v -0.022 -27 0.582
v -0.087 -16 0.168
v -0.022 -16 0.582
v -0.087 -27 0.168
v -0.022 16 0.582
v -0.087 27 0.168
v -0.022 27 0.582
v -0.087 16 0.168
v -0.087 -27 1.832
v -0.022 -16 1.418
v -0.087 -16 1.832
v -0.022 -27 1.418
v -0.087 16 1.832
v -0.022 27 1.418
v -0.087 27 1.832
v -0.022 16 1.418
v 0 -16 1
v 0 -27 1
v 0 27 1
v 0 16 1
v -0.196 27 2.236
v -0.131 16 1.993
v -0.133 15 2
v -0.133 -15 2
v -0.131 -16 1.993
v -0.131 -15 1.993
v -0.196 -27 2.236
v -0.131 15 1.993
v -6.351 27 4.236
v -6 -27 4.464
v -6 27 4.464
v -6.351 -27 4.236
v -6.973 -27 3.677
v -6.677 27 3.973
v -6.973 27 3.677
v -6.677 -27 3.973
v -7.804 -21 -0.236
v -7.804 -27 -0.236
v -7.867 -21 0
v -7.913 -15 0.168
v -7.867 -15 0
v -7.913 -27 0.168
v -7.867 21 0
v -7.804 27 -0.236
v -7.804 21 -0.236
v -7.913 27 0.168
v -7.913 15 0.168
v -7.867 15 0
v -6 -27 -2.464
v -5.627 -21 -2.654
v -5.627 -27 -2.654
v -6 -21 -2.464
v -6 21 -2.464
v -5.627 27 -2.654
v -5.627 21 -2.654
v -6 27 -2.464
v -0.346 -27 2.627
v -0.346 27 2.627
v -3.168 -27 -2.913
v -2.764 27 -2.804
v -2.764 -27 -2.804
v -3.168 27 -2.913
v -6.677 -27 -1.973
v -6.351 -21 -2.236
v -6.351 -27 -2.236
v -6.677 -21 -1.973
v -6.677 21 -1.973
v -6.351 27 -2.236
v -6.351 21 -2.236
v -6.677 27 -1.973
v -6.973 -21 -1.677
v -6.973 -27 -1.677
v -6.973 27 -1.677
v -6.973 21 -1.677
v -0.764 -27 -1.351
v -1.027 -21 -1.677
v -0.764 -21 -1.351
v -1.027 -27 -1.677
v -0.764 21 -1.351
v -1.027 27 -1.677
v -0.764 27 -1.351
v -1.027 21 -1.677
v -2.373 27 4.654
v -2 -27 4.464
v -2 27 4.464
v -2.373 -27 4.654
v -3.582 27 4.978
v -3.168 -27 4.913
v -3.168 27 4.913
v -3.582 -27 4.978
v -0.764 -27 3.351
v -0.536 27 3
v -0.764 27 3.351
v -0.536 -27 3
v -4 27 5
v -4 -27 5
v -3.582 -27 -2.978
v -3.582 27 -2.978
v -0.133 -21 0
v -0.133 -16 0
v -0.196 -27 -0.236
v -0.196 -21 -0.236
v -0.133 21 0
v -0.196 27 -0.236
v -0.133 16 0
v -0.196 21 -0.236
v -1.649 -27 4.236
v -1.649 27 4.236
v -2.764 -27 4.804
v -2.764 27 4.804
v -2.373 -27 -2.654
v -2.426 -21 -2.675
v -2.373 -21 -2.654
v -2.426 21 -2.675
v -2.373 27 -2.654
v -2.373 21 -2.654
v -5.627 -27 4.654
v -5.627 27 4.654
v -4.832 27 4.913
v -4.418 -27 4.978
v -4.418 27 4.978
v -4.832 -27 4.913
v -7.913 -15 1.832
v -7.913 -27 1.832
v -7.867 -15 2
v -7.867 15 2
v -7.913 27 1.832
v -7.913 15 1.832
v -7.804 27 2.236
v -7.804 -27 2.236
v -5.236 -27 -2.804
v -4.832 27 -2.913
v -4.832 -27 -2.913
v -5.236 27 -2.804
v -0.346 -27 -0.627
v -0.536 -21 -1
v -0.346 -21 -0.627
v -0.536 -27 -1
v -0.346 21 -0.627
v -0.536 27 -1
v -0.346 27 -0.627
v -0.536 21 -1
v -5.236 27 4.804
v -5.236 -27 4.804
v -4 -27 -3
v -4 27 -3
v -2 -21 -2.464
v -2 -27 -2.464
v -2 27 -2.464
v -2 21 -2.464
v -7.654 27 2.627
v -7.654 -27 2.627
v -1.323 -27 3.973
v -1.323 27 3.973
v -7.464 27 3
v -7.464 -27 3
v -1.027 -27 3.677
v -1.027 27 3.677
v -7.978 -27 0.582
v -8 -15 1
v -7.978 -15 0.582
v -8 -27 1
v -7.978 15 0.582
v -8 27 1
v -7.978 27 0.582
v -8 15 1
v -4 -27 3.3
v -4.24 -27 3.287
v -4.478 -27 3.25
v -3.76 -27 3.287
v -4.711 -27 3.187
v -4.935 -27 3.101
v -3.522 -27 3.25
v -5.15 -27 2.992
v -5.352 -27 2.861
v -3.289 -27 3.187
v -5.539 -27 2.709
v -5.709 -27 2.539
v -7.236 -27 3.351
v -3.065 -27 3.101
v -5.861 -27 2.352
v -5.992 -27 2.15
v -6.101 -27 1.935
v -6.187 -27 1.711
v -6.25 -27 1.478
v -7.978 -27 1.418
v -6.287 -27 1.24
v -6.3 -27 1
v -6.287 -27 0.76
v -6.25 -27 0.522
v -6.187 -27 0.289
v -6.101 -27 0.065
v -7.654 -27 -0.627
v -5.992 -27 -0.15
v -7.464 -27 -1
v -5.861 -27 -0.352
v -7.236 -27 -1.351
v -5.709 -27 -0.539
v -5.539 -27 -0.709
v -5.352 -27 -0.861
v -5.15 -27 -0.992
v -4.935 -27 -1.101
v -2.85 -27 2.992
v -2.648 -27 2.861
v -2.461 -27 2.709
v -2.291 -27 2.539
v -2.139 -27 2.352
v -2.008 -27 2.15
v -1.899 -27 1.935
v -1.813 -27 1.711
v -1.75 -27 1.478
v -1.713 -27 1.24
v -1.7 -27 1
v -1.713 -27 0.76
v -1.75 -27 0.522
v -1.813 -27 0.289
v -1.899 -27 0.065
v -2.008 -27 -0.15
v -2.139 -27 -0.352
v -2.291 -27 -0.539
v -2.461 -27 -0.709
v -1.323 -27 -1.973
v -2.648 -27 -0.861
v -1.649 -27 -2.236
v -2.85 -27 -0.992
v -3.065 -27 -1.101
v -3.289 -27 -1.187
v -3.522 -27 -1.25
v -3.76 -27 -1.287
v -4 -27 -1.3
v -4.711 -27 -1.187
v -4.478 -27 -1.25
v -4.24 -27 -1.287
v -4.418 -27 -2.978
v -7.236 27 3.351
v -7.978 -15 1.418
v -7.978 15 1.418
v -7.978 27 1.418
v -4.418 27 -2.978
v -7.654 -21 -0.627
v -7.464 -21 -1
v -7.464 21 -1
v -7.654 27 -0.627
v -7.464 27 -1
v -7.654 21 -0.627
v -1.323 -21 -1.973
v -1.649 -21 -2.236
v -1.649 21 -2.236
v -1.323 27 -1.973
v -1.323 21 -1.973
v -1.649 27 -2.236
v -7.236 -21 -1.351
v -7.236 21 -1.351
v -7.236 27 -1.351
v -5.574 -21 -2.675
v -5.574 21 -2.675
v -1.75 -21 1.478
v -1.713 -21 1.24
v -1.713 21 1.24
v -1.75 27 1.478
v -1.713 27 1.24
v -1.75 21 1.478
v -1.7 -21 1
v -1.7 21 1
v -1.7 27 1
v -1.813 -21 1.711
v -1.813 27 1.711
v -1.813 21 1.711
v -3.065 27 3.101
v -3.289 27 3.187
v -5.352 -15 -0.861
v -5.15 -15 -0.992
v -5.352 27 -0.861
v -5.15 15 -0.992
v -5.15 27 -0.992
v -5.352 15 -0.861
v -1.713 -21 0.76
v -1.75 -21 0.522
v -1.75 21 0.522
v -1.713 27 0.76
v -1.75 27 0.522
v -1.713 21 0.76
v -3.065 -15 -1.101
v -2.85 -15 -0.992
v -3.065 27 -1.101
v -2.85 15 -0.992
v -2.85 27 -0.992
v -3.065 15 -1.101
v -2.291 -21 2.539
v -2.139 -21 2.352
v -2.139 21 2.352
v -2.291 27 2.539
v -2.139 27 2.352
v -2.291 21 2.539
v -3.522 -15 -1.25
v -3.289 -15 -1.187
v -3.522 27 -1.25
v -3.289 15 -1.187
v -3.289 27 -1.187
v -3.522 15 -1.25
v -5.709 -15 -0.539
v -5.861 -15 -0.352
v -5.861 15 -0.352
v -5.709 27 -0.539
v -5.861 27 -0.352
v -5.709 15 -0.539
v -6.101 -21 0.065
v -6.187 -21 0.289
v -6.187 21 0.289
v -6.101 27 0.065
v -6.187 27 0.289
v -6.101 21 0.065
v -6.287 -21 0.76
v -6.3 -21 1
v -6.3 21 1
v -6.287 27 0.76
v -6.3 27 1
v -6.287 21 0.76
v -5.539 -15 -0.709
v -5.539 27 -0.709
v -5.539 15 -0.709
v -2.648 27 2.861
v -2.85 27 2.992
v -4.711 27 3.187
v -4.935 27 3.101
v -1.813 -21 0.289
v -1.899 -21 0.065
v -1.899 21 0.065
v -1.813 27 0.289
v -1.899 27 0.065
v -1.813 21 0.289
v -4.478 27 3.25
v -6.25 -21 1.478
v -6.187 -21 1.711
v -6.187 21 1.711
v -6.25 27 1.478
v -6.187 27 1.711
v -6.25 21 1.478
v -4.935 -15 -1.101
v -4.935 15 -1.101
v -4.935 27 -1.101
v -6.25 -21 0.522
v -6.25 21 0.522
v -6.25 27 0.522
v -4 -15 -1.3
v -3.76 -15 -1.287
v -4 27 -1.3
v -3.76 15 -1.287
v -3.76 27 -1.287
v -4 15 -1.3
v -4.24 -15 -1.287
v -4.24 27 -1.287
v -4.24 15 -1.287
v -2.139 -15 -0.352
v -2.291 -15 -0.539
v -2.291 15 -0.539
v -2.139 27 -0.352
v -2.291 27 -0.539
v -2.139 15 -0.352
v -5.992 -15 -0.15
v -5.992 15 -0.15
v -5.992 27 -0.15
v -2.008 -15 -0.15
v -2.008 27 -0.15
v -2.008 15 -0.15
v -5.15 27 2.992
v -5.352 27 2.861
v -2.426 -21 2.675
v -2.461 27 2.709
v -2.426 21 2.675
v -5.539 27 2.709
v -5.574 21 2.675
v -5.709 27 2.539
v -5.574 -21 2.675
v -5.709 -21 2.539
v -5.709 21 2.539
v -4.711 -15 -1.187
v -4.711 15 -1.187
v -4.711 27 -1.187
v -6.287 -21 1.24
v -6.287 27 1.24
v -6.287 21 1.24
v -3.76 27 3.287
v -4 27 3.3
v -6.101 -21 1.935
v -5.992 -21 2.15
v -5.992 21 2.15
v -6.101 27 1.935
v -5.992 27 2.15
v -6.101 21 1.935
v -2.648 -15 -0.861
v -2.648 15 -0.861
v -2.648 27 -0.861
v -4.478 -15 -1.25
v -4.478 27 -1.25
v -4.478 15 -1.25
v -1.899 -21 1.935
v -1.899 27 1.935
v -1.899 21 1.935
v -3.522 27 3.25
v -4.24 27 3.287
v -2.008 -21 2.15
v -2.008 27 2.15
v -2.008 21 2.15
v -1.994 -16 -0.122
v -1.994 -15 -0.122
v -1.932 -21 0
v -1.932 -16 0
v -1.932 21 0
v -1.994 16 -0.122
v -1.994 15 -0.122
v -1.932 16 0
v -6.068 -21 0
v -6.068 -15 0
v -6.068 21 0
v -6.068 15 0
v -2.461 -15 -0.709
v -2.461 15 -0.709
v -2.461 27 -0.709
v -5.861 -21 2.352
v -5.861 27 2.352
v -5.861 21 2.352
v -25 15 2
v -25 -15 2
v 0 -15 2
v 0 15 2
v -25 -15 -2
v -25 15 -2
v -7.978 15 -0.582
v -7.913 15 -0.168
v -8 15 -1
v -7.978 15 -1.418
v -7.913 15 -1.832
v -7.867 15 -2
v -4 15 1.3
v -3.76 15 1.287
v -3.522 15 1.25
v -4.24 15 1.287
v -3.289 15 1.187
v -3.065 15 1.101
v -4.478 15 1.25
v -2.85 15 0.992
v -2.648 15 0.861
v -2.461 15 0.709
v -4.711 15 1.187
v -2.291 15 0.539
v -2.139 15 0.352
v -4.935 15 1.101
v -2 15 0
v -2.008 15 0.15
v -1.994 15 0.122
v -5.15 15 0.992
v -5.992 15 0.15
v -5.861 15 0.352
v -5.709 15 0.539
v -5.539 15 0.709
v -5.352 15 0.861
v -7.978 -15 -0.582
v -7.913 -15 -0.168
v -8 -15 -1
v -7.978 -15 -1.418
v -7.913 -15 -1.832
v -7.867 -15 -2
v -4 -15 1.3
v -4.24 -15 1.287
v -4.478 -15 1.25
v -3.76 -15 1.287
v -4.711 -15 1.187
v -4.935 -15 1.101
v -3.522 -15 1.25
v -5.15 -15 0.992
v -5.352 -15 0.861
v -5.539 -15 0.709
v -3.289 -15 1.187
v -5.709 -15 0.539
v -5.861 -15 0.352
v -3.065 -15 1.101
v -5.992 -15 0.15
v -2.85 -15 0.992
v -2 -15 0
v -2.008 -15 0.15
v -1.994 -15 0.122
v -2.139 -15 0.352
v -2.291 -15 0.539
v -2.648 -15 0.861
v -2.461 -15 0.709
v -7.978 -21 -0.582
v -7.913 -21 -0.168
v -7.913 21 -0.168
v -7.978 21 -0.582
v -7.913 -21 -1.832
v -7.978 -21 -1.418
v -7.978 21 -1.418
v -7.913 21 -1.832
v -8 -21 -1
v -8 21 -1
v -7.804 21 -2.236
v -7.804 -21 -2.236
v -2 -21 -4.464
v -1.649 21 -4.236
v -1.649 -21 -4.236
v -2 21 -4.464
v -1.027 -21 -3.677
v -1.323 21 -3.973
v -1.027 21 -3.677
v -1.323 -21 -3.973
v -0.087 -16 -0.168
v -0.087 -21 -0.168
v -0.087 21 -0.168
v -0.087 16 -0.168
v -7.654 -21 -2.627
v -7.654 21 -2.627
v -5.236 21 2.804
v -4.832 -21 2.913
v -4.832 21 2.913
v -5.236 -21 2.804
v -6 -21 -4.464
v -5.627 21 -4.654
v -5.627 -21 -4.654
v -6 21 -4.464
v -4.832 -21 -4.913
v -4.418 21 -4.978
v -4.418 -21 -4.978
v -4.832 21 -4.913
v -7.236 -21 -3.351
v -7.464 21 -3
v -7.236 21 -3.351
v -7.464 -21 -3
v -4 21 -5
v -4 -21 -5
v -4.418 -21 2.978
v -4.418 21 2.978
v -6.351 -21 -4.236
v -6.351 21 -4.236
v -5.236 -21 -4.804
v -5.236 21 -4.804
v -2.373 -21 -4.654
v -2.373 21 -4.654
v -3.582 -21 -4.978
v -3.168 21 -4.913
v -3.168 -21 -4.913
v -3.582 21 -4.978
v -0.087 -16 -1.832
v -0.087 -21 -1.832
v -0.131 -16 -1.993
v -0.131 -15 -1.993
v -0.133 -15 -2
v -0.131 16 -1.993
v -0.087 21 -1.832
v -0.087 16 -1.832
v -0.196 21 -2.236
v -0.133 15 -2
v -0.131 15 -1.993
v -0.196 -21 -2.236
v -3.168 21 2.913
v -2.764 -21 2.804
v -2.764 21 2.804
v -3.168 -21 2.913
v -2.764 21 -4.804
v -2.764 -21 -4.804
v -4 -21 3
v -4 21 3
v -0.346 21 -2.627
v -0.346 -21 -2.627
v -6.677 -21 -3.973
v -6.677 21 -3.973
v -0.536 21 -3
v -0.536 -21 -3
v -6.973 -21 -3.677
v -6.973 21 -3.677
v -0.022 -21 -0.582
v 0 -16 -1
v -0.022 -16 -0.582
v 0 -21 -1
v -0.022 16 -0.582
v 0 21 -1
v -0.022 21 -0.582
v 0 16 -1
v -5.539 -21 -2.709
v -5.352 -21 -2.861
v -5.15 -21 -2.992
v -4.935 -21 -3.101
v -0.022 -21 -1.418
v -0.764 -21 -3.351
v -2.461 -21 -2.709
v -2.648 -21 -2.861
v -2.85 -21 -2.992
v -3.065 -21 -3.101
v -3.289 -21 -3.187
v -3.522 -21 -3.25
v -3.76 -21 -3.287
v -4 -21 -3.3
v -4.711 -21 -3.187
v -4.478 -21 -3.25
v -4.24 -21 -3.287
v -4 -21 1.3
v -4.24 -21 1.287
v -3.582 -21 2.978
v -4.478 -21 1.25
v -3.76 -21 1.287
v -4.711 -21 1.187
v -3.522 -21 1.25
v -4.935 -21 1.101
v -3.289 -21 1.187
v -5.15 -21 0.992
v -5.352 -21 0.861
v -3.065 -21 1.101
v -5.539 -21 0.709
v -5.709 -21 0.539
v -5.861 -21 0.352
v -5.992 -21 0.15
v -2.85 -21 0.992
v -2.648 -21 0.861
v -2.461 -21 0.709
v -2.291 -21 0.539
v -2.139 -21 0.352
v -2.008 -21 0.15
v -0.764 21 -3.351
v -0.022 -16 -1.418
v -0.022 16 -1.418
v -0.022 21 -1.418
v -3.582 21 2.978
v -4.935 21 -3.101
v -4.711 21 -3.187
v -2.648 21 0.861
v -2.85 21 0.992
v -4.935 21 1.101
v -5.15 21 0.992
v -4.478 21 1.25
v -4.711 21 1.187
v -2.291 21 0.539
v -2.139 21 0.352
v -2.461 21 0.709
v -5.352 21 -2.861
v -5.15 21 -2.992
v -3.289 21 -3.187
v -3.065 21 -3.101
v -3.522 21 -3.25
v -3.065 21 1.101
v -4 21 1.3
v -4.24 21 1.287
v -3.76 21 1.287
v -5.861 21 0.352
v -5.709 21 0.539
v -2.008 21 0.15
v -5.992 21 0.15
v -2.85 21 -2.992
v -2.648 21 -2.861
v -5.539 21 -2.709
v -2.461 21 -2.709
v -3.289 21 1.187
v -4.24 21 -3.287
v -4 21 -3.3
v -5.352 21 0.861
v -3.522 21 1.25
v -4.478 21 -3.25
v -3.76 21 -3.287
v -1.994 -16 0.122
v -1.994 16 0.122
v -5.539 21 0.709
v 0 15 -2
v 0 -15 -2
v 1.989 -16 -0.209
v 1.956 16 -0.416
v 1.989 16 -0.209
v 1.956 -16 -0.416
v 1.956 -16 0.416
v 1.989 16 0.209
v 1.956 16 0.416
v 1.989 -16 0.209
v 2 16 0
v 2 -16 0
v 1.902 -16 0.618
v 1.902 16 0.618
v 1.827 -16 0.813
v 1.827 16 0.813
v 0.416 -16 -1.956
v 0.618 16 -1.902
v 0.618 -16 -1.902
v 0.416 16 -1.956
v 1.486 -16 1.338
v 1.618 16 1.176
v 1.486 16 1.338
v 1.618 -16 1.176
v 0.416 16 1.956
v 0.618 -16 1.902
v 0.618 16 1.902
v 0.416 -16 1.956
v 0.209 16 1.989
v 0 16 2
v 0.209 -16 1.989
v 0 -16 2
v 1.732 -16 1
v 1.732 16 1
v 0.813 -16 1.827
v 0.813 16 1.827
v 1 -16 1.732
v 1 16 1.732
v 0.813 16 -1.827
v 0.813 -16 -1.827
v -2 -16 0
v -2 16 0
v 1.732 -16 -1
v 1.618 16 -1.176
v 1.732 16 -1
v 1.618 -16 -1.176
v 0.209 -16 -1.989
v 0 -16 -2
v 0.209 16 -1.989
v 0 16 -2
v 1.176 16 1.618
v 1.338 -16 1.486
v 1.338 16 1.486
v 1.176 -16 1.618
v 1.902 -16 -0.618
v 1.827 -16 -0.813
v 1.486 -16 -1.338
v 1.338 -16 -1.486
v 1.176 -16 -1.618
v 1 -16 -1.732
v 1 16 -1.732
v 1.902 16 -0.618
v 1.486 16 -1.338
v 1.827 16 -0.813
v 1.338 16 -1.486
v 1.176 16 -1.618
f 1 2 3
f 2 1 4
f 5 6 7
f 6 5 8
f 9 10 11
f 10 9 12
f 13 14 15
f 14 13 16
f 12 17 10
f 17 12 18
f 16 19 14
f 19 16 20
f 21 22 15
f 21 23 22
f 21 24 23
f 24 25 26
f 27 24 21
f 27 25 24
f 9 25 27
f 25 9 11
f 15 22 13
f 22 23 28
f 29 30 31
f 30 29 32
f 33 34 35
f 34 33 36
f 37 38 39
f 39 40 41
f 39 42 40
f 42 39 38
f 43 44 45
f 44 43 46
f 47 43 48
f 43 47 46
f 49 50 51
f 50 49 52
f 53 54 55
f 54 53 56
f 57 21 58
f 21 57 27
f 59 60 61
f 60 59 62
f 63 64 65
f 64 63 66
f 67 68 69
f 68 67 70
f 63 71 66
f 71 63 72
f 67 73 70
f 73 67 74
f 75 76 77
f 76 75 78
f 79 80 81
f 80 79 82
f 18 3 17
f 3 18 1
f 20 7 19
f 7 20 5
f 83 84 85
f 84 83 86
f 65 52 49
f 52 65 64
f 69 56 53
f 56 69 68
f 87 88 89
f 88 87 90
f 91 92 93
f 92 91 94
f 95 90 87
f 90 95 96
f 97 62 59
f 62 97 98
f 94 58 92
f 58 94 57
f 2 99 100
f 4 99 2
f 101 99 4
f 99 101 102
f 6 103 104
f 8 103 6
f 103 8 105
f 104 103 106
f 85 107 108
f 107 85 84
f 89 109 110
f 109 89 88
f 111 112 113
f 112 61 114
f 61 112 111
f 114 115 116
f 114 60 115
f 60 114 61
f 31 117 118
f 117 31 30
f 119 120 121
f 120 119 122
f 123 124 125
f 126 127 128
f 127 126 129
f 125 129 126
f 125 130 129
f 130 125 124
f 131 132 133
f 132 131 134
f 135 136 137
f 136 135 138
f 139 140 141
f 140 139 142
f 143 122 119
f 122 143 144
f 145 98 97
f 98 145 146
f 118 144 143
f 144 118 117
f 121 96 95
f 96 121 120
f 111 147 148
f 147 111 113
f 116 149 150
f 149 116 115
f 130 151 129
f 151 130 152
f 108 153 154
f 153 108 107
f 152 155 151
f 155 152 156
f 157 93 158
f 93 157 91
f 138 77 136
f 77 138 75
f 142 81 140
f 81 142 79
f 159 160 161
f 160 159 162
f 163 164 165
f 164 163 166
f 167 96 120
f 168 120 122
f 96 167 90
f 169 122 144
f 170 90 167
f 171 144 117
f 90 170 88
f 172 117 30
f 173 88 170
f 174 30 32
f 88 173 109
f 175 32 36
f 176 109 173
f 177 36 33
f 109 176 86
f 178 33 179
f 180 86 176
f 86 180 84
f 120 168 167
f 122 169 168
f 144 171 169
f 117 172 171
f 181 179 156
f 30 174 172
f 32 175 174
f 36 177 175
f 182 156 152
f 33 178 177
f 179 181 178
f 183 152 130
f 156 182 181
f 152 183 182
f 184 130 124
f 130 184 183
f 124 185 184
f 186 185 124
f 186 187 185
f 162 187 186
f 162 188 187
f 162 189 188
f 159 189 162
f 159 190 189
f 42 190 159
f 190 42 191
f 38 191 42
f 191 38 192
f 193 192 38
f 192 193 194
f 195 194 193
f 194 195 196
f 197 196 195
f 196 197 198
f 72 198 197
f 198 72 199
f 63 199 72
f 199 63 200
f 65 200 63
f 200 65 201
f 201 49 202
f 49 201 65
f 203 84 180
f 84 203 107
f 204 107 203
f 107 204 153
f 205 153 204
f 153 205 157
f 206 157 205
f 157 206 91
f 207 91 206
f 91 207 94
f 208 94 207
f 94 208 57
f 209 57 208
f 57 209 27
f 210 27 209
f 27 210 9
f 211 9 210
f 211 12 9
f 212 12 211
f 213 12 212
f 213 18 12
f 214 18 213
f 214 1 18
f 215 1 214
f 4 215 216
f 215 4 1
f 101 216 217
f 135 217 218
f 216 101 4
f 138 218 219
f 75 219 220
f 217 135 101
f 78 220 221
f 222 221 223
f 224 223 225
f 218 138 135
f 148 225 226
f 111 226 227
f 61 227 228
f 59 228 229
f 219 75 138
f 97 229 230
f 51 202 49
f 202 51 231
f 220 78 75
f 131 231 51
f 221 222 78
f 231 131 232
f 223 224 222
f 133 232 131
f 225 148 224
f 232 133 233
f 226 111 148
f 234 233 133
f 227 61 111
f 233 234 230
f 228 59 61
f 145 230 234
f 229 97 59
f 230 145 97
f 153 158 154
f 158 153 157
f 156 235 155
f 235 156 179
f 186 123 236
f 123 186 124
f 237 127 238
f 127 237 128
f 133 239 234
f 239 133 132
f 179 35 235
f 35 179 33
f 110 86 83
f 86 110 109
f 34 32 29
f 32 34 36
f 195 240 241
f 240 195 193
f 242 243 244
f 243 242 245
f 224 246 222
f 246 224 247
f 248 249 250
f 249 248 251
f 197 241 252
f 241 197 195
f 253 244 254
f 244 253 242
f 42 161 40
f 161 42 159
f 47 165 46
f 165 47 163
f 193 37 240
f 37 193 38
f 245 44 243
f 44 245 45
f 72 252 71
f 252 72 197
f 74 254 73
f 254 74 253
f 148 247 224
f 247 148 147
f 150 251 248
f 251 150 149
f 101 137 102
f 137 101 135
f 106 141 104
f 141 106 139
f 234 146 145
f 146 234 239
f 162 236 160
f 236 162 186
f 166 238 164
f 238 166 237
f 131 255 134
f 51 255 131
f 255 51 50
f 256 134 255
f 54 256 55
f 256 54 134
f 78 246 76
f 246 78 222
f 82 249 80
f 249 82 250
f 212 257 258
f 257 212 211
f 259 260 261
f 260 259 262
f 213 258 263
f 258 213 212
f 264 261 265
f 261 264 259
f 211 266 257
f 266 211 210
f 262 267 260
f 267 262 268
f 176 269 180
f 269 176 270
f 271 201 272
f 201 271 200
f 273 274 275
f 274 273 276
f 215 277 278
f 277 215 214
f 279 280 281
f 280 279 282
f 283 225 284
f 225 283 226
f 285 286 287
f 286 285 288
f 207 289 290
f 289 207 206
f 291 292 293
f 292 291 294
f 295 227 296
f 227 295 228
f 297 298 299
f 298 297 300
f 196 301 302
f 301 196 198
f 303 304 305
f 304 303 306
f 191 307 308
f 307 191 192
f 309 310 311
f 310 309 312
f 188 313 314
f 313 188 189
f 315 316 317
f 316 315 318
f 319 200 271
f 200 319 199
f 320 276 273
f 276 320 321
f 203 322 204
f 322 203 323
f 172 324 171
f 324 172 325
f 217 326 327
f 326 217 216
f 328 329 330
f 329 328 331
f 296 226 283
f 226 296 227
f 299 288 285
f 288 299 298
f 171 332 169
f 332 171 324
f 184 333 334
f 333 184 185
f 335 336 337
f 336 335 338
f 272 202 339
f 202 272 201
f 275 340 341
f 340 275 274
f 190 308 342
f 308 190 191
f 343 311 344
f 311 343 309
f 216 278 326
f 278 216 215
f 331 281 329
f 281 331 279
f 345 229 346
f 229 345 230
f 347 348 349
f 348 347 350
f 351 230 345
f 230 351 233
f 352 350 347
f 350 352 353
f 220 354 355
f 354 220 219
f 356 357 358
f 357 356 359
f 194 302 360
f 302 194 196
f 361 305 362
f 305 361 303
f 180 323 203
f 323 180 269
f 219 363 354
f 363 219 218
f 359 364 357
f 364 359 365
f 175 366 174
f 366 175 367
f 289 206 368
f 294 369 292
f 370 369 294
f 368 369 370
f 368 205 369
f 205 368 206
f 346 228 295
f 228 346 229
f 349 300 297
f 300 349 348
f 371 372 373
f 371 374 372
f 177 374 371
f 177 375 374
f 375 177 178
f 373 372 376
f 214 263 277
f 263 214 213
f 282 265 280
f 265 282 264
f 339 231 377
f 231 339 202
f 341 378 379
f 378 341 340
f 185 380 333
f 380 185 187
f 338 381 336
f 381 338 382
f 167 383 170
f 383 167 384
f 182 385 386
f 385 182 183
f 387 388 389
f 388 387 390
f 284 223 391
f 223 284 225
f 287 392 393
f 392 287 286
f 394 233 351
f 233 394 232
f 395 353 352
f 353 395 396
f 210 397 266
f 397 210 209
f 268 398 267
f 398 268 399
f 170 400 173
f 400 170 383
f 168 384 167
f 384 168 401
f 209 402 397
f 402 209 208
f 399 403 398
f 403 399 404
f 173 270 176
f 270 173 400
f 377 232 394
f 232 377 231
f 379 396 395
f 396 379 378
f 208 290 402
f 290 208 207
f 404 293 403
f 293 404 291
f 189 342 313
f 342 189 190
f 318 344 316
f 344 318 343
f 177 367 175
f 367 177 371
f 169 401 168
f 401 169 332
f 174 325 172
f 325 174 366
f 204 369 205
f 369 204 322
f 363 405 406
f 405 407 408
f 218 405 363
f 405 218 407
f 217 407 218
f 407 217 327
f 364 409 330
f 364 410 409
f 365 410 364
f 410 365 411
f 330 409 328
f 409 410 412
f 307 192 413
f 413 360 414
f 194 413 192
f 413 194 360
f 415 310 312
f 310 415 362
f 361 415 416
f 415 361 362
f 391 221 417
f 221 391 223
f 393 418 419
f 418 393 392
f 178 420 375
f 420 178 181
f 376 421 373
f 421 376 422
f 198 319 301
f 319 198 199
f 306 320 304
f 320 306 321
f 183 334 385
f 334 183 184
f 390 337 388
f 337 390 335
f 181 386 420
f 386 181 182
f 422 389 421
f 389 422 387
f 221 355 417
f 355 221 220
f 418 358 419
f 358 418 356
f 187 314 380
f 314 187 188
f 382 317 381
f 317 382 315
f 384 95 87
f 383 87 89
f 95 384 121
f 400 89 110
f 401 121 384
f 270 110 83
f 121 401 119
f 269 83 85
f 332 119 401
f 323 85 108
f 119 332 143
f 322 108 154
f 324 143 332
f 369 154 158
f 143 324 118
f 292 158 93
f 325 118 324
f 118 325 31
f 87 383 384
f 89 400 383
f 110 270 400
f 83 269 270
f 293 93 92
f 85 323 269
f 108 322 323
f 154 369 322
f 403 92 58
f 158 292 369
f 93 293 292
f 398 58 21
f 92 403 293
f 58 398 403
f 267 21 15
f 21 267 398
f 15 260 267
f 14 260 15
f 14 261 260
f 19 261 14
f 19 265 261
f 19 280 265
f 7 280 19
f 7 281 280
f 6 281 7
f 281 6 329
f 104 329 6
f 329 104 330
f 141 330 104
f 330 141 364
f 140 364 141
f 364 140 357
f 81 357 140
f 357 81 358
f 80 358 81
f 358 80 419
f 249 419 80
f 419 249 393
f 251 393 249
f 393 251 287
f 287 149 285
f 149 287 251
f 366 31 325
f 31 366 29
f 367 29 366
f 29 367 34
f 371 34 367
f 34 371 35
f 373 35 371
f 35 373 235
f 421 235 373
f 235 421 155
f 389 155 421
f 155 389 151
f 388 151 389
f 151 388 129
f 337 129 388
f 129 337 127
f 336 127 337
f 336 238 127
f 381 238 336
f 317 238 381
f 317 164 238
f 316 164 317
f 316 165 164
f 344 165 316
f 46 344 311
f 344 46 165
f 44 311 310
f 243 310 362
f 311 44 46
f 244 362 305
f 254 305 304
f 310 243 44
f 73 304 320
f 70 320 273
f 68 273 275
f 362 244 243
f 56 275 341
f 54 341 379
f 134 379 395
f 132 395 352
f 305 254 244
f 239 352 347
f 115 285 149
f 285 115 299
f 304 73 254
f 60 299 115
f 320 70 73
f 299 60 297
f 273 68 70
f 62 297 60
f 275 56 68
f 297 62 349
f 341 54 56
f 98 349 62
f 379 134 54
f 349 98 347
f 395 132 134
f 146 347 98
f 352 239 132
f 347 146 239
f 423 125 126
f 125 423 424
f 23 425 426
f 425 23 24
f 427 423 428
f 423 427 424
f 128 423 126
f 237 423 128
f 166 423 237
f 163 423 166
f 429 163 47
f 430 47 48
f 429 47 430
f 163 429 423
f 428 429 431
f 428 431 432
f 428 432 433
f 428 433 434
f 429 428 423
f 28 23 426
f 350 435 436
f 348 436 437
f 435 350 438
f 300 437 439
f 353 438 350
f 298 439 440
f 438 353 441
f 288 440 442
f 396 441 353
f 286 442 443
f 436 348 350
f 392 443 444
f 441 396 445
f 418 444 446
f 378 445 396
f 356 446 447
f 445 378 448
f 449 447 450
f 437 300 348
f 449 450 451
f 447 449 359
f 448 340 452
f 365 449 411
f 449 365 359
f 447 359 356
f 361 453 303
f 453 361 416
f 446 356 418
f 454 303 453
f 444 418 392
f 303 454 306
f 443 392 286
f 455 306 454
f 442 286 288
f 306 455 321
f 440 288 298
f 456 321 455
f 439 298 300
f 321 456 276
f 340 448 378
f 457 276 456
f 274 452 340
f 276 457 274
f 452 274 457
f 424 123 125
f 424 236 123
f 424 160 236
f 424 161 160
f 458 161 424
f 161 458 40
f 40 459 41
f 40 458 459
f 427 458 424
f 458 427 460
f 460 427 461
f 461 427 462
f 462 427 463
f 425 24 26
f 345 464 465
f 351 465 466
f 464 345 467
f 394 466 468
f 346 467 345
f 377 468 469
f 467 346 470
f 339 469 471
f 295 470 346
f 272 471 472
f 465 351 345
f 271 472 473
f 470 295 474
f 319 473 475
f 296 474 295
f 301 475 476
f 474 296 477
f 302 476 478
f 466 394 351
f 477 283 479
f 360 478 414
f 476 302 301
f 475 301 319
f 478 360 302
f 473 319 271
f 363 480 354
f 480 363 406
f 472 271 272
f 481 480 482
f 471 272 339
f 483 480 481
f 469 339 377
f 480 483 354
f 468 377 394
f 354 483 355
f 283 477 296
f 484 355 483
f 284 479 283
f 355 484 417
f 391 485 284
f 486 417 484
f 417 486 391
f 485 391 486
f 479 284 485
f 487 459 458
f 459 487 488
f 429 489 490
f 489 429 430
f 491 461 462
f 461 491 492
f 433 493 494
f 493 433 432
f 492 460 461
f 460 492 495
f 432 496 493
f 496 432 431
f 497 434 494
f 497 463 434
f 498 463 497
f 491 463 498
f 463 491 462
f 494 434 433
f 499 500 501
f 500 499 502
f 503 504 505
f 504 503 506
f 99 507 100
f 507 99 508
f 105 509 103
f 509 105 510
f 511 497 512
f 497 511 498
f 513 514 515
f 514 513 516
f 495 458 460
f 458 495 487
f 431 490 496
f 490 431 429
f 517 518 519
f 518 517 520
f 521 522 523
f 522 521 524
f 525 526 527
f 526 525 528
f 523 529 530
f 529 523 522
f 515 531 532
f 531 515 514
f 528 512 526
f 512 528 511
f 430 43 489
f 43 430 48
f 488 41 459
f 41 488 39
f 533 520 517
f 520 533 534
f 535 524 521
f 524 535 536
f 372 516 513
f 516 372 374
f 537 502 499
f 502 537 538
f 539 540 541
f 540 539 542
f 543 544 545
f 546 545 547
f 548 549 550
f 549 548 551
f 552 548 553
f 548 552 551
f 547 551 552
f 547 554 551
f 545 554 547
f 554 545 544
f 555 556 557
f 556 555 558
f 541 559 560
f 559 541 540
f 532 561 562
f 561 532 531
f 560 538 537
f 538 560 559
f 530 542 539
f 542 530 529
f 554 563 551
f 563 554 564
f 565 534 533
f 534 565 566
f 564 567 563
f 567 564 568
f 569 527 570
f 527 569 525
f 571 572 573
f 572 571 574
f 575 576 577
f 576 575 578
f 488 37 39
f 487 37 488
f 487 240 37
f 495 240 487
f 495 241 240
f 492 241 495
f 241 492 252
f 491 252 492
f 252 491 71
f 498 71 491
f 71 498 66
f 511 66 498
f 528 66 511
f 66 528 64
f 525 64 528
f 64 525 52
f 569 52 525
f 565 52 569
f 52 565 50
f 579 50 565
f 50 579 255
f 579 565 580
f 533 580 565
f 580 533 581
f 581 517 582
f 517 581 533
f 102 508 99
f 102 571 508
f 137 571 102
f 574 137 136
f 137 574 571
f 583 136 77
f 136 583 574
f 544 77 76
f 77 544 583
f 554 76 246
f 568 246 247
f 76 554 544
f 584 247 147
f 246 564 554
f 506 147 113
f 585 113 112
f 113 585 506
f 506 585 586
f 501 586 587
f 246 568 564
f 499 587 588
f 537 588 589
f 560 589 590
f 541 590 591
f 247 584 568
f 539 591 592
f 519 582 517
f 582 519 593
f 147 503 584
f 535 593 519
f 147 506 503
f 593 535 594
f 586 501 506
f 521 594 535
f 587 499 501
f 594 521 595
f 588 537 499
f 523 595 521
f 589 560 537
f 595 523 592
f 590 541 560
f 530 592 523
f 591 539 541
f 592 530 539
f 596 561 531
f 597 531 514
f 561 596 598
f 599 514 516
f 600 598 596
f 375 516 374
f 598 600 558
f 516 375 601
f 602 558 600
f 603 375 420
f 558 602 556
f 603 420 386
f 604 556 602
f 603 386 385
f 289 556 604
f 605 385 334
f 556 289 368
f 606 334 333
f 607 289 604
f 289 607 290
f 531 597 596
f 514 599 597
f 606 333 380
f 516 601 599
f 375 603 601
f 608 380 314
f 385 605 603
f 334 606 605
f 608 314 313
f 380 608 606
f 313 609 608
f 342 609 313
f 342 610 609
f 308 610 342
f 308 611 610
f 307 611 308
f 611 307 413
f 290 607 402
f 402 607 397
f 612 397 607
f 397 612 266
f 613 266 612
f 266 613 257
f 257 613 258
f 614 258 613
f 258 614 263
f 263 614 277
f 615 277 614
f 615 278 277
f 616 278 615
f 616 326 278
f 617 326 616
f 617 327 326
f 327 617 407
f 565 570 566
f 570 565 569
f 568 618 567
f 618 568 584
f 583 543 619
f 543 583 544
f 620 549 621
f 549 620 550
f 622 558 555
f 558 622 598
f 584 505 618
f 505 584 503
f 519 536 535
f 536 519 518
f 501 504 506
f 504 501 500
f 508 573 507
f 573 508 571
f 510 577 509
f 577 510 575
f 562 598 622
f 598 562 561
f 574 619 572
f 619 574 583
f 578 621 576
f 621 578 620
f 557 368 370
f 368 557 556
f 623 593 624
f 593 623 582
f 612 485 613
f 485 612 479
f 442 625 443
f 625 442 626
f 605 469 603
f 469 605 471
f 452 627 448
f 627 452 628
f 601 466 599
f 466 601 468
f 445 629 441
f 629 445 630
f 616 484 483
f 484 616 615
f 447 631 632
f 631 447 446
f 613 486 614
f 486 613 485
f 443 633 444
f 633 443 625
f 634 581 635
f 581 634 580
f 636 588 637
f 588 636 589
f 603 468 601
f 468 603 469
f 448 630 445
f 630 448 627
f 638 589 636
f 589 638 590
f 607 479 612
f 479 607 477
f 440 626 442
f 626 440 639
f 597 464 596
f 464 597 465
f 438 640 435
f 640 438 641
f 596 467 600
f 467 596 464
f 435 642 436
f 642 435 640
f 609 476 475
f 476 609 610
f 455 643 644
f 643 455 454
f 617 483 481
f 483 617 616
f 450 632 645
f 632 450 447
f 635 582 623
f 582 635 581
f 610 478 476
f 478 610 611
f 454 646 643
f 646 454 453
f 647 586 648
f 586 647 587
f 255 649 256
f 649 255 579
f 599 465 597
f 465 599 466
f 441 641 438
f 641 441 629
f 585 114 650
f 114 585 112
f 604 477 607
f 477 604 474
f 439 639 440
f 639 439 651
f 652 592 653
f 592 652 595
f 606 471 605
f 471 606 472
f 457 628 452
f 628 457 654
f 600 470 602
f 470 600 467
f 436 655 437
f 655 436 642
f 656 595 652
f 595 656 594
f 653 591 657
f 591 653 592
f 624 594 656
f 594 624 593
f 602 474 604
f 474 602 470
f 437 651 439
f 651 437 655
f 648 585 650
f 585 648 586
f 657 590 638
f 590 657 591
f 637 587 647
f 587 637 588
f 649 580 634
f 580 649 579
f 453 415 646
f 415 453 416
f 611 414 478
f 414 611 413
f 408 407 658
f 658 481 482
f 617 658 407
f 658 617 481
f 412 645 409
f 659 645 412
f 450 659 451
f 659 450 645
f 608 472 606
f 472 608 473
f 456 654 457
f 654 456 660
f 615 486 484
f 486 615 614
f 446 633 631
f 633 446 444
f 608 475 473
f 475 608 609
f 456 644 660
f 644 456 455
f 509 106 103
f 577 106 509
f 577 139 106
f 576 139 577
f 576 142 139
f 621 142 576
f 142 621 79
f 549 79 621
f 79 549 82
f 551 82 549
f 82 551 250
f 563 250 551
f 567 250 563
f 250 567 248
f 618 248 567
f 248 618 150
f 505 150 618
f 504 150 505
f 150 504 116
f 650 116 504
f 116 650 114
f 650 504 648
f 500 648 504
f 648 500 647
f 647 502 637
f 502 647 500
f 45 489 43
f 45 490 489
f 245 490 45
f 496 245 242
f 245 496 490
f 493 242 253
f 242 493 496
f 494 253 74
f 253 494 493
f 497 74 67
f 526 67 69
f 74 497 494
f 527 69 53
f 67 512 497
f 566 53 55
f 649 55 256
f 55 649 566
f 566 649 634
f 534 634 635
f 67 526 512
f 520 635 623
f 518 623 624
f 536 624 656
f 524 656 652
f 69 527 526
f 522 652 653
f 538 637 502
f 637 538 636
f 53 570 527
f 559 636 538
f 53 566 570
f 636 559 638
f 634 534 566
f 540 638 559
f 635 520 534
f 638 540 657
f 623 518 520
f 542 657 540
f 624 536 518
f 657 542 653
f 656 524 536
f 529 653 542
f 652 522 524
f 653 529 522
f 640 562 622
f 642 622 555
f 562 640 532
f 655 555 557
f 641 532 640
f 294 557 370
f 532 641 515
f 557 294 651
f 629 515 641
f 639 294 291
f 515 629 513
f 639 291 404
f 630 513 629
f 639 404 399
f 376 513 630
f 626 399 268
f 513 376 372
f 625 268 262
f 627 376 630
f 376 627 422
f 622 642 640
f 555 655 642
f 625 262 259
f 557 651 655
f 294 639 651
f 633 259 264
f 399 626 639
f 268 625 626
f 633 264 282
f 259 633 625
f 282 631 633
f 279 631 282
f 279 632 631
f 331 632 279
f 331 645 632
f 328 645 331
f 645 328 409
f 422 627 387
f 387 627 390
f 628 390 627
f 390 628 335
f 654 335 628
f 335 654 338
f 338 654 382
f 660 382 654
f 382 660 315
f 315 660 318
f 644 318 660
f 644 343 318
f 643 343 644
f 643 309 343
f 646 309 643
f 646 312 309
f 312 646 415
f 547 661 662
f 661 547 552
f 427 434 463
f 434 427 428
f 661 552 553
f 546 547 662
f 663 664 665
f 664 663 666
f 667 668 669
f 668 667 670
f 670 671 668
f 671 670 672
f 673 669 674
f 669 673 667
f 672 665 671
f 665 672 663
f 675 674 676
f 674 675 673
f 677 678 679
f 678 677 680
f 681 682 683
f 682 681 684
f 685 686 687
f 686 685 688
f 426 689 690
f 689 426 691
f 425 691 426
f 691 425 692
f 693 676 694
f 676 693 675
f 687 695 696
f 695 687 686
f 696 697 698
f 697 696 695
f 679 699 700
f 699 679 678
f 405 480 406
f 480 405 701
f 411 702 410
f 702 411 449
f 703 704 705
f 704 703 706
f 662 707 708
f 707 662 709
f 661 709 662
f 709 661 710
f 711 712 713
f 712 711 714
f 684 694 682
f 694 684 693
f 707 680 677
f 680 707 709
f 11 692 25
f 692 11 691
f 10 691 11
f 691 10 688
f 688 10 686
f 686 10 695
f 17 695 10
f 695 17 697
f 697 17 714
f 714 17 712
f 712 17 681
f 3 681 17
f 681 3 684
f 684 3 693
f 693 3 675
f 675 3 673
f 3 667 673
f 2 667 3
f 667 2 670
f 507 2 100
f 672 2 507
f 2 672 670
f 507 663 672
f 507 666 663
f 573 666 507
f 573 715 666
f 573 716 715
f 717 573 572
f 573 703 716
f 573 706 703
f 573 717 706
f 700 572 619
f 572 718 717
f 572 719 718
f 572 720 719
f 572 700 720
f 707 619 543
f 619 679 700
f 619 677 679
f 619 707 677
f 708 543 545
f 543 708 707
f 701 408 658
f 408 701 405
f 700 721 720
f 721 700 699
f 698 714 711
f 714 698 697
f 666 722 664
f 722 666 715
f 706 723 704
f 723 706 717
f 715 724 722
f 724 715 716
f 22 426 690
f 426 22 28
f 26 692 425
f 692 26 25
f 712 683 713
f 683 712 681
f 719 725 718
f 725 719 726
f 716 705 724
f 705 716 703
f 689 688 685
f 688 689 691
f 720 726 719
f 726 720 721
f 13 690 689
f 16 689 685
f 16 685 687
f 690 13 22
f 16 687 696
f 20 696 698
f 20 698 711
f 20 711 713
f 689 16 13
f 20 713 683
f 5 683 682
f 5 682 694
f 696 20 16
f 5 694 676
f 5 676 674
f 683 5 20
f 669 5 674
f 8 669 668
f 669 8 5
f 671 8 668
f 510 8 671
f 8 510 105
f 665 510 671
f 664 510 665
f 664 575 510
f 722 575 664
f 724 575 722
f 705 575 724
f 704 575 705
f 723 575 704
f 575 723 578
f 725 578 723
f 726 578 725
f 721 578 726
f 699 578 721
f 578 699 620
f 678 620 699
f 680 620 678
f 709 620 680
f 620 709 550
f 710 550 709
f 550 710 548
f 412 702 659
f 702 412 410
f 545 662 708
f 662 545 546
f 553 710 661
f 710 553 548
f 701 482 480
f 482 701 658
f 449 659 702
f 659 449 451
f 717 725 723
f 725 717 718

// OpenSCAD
// 修正後 OpenSCAD: 家具用小型 butt hinge (180° 開き) - 左板/右板/ピン軸
// 前提仕様を厳密に反映するよう knuckle を中空構造で再実装し、
// knuckle 内径 4.6mm（ピン径 4mm に対する 0.3mmクリアランス）を確保します。

// 基本寸法
leaf_W = 25;      // 板の横幅 (X方向)
leaf_H = 30;      // 縦寸法 (Y方向)
leaf_T = 2;       // 厚さ (Z方向)

// knuckle / ピン
knuckle_OD = 8;     // 外径
knuckle_R  = knuckle_OD/2;
hole_d     = 4.6;   // knuckle 内径
hole_R     = hole_d/2;
pin_D      = 4;     // ピン径
pin_R      = pin_D/2;

// knuckle のY方向分割
left_knuckles_Y  = [-12, 0, 12];  // 左板: 外側2個 + 中央1個
right_knuckles_Y = [-6, 6];       // 右板: 中間2個

// knuckle から離れた側の皿穴位置（M3）
M3_pocket_Y_left  = [-12, -4, 4];
M3_pocket_Y_right = [-12, -4, 4];

// 筐体カラーのための座標系に合わせたオフセット
// 左板: X=-25〜0、右板: X=0〜25、Z=0〜2
// knuckle は X 軸方向に -4（左）/ +4（右）を中心とする
$fn = 60;

// knuckle: 単一の knuckle を左・右で使い分け、外径 8mm/内径 4.6mm の中空筒を Y 軸方向に配置
module hollow_knuckle(isLeft, y) {
    x = isLeft ? -4 : 4;
    translate([x, y, 1])
        rotate([90, 0, 0])
            difference() {
                // 外筒 (knuckle 外径)
                cylinder(h = leaf_H, r = knuckle_R, center = true);
                // 内穴 (ピン軸径 + 0.3mm クリアランス → 4.6mm)
                cylinder(h = leaf_H, r = hole_R, center = true);
            }
}

// M3 皿穴 + テーパ付き countersink
module m3_hole_at(x, y) {
    // countersink: 表面から depth 1mm, dia 6mm
    translate([x, y, leaf_T - 1])
        cylinder(h = 1, r1 = 3, r2 = 0, center = false);

    // 貫通穴: 3.2mm dia
    translate([x, y, 0])
        cylinder(h = leaf_T, r = 1.6, center = false);
}

// 左板 (X<0)
module left_leaf() {
    union() {
        // 左板本体
        translate([-25, -15, 0])
            cube([25, 30, 2], center = false);

        // knuckle（左板: 外側2個 + 中央1個）
        for (y = left_knuckles_Y)
            hollow_knuckle(true, y);

        // knuckle から離れた側の M3 皿穴
        for (y = M3_pocket_Y_left)
            m3_hole_at(-20, y);
    }
}

// 右板 (X>0)
module right_leaf() {
    union() {
        // 右板本体
        translate([0, -15, 0])
            cube([25, 30, 2], center = false);

        // knuckle（右板: 中間2個）
        for (y = right_knuckles_Y)
            hollow_knuckle(false, y);

        // knuckle から離れた側の M3 皿穴
        for (y = M3_pocket_Y_right)
            m3_hole_at(20, y);
    }
}

// ピン軸（Y軸方向、+Y 方向に伸びる）
module pin_axis() {
    rotate([90, 0, 0])
        cylinder(h = 32, r = pin_R, center = true);
}

// 完成した180°開きの状態
module hinge_open_state() {
    union() {
        left_leaf();
        rotate([0, 180, 0]) right_leaf();
        pin_axis();
    }
}

// 出力
hinge_open_state();
